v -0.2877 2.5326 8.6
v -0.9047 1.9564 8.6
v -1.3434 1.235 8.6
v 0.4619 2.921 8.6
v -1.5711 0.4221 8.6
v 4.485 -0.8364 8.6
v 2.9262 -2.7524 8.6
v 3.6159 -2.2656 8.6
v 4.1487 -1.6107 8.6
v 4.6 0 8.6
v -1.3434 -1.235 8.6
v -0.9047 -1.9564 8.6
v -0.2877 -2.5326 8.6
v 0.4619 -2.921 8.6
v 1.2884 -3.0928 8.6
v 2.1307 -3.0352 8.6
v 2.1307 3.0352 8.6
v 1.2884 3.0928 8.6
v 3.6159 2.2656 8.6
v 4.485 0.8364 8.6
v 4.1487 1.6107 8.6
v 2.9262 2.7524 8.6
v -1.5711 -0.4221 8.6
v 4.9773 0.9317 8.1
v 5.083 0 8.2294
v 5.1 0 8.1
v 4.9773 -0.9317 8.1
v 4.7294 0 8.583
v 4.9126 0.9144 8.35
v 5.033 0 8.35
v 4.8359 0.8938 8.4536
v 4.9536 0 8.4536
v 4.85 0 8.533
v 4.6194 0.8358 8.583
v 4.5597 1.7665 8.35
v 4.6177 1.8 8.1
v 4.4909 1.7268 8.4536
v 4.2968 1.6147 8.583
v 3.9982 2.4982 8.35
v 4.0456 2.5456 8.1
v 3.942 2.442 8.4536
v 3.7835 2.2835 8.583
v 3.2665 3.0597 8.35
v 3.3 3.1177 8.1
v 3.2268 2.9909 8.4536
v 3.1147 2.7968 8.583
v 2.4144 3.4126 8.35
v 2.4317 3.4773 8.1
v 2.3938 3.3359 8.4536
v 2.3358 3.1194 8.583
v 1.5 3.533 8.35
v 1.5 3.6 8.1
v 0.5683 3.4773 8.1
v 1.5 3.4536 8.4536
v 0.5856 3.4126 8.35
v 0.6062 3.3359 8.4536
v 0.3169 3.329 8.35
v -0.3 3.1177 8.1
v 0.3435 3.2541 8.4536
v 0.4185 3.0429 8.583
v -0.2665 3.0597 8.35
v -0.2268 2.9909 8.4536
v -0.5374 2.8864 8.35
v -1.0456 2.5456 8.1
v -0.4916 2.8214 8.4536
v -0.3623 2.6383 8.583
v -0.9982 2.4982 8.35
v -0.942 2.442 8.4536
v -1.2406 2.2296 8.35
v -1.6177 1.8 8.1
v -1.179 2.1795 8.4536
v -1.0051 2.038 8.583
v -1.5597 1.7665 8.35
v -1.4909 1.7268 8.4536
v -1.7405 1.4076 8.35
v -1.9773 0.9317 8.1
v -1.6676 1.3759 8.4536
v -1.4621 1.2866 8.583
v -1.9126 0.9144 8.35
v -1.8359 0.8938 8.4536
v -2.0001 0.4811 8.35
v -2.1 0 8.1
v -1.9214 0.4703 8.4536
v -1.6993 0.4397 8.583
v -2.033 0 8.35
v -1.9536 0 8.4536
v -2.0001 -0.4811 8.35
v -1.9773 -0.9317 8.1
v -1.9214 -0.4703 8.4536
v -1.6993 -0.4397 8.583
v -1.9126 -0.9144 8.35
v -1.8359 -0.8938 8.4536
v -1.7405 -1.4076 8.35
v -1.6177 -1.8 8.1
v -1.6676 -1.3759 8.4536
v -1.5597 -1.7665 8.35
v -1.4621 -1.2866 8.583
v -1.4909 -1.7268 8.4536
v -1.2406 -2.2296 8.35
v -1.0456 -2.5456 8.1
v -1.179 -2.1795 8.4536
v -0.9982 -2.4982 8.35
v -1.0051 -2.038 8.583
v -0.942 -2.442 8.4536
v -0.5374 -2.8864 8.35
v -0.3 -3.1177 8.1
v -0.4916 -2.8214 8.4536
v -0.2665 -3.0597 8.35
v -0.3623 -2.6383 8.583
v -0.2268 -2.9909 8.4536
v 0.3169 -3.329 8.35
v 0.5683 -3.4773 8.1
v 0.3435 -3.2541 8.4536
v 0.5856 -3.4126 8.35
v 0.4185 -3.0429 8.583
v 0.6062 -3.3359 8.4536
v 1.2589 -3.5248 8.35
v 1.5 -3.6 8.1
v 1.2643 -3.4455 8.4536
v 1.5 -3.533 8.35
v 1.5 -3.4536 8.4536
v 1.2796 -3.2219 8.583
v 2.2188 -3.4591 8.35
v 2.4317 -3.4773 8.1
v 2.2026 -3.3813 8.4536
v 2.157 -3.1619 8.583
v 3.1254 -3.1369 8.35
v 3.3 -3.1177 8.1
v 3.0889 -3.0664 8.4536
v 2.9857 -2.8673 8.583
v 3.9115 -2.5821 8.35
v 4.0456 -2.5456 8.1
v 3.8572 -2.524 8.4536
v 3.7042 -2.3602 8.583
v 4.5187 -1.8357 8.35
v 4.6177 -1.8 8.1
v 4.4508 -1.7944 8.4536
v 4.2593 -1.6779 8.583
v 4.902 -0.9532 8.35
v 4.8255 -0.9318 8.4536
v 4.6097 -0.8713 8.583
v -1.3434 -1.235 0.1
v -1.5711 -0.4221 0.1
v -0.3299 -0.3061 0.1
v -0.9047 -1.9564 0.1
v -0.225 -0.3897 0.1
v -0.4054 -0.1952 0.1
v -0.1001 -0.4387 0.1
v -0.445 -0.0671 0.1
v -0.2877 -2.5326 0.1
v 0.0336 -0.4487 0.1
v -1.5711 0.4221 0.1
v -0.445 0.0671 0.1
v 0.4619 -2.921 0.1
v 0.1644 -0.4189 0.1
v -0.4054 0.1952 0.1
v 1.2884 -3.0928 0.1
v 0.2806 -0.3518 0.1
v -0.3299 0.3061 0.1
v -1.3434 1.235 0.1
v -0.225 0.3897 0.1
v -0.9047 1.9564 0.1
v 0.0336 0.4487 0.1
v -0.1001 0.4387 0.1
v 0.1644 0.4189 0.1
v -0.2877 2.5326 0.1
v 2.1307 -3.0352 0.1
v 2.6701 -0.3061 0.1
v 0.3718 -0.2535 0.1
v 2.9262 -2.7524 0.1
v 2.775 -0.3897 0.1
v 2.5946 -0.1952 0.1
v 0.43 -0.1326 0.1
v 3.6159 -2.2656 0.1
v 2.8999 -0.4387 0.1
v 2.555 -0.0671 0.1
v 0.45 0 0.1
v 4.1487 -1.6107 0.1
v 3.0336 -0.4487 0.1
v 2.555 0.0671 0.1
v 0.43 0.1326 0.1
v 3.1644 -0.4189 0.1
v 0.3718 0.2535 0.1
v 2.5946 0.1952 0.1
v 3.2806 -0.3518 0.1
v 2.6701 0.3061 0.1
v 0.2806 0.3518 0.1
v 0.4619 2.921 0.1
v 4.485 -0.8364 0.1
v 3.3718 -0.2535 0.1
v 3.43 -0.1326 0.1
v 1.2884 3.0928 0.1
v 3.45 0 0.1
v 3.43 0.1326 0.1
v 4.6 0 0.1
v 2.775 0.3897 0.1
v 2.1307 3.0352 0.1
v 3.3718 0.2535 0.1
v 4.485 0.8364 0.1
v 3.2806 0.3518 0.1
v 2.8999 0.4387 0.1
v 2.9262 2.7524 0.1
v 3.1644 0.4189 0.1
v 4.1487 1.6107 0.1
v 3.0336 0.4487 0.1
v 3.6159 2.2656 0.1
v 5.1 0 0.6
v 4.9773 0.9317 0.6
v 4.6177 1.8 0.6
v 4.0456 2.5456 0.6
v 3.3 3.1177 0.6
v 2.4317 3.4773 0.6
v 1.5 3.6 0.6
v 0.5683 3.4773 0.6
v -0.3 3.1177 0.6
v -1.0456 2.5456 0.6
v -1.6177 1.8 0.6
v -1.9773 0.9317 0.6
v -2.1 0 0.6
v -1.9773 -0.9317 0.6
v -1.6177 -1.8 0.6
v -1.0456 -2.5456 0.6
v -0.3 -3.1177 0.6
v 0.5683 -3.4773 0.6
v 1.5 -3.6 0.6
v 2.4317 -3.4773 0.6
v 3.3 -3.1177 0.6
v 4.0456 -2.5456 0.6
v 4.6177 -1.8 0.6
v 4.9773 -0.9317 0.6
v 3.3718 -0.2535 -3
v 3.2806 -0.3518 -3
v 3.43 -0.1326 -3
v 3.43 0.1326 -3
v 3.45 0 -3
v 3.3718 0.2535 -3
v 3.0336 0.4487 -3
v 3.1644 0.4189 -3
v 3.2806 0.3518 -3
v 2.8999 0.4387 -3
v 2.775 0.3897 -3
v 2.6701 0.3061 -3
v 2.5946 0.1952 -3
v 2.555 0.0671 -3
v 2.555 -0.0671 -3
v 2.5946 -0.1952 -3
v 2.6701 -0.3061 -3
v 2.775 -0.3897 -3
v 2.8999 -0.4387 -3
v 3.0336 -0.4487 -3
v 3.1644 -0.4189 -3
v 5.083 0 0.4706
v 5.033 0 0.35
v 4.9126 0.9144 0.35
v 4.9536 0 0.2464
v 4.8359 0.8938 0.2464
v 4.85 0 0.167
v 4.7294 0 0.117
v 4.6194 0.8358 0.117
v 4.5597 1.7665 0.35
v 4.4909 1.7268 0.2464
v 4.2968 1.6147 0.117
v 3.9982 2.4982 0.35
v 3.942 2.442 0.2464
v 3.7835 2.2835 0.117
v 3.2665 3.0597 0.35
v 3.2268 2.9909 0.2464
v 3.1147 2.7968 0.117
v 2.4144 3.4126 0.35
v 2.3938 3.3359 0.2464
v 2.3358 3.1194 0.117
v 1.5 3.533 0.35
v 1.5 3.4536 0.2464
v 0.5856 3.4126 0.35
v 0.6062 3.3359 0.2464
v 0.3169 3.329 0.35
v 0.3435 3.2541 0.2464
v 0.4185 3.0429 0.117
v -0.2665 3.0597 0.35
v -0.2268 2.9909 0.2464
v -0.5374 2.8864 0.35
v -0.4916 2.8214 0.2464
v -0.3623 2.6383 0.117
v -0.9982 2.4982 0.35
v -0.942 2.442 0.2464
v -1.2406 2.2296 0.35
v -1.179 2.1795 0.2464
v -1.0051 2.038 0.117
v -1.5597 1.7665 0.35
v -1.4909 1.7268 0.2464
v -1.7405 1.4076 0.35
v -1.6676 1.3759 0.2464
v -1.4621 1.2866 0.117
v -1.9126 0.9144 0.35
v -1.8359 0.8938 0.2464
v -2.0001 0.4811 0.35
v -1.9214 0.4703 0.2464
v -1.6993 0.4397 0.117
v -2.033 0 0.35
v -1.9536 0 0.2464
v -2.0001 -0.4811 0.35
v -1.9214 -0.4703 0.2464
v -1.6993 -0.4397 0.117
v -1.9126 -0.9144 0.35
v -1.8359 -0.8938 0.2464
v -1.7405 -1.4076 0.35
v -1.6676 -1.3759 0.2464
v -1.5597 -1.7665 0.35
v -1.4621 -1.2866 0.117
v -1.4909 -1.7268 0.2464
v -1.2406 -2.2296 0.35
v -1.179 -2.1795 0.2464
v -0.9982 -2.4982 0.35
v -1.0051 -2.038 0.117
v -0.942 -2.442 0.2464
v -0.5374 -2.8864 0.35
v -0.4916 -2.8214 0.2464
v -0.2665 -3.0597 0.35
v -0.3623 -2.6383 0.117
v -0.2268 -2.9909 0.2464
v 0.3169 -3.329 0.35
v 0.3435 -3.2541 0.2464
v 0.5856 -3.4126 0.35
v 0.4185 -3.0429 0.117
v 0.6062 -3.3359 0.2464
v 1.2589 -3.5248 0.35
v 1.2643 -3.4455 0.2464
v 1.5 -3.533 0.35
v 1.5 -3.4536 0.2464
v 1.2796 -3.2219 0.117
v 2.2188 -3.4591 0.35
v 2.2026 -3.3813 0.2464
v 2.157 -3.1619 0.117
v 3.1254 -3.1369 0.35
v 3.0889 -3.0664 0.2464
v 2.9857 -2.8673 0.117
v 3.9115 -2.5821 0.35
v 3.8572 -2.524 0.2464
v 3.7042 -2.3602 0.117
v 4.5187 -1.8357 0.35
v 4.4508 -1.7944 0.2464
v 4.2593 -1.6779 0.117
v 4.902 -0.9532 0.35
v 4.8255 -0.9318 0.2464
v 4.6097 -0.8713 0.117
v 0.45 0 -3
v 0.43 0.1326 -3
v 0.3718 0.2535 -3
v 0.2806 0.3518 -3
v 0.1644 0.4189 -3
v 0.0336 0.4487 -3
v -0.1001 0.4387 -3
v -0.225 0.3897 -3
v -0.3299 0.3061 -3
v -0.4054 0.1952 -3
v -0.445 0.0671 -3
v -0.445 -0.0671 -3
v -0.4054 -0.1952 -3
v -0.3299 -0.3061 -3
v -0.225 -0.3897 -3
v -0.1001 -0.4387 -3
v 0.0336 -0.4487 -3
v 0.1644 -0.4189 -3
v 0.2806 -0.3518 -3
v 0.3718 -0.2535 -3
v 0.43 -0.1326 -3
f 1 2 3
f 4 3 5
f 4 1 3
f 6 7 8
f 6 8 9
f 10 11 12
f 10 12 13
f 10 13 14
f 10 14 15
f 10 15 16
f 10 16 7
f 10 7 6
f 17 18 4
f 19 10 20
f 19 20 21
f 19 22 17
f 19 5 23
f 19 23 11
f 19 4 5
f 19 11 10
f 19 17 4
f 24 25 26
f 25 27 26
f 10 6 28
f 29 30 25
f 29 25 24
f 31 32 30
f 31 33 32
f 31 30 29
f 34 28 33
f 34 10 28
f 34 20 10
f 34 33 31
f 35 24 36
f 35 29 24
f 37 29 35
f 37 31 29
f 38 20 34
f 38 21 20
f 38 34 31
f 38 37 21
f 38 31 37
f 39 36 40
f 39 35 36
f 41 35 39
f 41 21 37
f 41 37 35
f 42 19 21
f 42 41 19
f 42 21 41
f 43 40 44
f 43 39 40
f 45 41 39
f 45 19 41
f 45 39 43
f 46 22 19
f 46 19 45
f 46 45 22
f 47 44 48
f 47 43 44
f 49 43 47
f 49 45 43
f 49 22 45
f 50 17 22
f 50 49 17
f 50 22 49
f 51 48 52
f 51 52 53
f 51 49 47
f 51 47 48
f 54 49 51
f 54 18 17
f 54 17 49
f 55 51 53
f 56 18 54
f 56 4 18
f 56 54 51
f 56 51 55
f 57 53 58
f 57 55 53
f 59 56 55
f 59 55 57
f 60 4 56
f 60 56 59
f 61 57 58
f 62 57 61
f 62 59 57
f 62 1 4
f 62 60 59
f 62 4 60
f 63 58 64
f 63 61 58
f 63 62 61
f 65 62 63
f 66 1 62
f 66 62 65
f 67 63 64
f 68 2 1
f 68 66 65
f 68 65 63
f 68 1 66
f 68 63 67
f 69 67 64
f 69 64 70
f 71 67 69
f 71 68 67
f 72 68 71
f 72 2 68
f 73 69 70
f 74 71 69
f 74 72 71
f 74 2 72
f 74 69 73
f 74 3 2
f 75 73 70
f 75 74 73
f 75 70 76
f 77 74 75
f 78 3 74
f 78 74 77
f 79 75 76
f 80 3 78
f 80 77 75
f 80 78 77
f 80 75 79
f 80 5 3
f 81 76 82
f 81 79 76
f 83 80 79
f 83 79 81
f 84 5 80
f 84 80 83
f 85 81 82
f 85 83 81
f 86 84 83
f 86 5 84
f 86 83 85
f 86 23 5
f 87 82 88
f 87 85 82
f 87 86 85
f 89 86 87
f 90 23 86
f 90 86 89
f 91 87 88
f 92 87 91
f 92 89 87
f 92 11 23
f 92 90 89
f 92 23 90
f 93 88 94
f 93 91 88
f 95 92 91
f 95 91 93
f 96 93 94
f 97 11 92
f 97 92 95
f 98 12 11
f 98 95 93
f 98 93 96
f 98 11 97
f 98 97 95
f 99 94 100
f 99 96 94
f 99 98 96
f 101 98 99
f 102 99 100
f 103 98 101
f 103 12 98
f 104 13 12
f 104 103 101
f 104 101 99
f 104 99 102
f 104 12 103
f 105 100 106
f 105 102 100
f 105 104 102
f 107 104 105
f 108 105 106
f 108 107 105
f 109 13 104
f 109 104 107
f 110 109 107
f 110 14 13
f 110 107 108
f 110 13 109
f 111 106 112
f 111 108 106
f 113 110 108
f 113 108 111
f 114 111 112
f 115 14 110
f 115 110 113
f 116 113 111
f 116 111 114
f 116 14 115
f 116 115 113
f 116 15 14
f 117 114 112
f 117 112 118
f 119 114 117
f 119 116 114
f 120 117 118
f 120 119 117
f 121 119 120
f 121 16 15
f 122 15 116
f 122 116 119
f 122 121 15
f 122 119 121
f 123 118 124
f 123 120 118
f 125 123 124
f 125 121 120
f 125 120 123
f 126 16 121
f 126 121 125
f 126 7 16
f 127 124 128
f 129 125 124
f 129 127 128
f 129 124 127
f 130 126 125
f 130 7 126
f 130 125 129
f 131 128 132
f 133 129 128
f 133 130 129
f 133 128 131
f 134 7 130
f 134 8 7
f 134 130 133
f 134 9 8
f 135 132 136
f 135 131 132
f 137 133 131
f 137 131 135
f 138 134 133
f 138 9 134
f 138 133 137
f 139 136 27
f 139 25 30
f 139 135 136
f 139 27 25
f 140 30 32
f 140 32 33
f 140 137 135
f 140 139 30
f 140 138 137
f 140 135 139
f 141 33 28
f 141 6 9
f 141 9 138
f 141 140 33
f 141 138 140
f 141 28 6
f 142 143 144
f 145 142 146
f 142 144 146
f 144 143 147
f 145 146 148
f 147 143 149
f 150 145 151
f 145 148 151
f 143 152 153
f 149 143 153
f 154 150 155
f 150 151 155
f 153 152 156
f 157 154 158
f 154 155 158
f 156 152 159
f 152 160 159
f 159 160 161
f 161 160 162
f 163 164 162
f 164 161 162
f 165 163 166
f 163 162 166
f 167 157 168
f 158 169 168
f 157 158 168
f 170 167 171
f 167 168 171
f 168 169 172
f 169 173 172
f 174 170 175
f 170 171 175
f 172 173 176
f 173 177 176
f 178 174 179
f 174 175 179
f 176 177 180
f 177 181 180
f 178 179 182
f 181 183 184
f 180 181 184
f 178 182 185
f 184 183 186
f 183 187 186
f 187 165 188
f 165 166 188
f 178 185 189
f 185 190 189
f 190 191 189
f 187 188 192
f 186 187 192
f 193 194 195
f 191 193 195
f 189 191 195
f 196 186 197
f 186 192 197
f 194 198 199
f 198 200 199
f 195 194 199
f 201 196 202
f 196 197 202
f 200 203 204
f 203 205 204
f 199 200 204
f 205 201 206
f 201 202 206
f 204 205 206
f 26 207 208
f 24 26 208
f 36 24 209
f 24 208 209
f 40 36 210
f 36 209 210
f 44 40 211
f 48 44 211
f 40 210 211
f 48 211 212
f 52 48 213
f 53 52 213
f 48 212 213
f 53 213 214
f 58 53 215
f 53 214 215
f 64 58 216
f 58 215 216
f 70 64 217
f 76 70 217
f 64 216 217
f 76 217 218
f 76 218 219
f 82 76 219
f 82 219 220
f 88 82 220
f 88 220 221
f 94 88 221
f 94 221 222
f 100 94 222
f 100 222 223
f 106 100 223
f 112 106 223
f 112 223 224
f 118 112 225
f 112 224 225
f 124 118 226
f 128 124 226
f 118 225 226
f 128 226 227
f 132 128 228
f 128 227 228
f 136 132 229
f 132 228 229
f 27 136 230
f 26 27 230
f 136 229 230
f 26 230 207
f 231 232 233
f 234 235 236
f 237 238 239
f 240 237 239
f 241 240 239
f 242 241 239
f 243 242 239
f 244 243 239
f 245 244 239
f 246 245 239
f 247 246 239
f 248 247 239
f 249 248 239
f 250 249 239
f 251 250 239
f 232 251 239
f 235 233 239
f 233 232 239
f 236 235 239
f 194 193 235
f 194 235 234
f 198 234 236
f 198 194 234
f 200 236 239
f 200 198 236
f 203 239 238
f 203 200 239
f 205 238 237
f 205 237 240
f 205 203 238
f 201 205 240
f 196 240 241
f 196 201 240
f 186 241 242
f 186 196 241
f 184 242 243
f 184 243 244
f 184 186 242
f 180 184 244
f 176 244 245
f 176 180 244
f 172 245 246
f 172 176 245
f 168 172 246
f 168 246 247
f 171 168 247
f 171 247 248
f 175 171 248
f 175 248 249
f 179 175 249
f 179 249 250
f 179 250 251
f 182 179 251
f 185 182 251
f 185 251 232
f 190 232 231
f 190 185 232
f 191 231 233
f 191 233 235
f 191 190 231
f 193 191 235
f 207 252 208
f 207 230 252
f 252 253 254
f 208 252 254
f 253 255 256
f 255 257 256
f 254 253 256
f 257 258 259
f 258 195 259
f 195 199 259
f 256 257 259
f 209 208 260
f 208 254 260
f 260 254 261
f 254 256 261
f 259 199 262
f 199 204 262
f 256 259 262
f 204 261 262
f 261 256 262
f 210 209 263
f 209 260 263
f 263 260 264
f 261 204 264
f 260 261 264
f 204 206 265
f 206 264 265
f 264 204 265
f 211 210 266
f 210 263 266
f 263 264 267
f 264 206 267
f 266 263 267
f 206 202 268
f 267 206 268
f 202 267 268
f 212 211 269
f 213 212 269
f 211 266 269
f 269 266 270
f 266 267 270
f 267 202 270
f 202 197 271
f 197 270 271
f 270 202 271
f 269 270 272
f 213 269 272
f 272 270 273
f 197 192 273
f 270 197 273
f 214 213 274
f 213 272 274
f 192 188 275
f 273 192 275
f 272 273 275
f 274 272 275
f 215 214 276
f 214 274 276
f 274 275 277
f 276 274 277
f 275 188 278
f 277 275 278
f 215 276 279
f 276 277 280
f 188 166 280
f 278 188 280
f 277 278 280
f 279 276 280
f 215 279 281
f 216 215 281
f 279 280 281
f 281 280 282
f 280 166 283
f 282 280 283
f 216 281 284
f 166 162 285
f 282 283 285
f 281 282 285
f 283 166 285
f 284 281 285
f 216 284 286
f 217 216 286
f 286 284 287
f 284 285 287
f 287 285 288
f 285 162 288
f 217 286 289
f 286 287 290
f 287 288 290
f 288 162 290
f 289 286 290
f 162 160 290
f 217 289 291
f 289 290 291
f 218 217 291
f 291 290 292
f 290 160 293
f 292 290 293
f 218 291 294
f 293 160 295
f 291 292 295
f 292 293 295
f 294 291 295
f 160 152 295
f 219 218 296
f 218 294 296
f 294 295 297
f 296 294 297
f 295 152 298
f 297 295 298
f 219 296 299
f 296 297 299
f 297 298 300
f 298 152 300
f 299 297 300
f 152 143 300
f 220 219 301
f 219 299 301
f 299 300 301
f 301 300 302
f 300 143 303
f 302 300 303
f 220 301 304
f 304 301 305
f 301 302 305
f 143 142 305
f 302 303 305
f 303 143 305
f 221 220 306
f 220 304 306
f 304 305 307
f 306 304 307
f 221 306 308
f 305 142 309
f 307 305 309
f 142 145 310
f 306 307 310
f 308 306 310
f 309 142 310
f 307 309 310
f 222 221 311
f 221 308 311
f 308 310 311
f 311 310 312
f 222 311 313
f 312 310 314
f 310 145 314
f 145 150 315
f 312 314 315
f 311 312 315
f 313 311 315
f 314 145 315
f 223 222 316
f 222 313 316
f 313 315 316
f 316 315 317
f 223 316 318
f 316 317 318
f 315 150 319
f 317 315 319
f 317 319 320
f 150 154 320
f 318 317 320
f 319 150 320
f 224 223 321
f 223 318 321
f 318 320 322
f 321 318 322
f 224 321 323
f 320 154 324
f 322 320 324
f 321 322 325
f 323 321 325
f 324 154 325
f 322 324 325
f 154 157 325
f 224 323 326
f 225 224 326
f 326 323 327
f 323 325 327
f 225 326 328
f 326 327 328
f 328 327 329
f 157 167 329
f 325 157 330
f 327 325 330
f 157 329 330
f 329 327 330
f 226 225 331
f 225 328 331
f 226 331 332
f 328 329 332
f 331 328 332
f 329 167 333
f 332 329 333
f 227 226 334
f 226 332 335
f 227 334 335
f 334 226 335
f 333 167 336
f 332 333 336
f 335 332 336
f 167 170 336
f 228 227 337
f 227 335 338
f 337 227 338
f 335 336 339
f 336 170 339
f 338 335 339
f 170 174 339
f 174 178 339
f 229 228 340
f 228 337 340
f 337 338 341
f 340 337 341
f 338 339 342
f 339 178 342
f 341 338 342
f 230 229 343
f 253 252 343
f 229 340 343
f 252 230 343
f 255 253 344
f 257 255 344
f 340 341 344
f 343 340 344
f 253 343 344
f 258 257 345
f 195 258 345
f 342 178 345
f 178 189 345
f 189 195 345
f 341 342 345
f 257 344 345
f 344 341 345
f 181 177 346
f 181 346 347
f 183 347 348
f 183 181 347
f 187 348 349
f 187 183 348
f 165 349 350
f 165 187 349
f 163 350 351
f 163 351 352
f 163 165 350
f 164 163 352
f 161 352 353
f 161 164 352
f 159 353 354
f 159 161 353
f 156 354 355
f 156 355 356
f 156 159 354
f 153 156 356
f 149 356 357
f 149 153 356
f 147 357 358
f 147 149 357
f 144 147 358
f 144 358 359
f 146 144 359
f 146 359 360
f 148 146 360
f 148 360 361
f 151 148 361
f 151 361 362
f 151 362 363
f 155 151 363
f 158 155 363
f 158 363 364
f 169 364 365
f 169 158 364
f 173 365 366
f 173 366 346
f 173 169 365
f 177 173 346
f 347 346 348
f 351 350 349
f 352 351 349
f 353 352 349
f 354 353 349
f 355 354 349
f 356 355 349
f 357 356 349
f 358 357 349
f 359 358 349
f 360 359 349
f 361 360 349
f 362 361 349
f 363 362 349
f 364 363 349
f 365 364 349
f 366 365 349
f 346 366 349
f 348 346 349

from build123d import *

# Parameters (mm, degrees)
SKETCH_R          = 3.6
PAD_DEPTH         = 8.5
FILLET_R          = 0.5
SKETCH001_R       = 0.45
PAD001_DEPTH      = 4.25
PAD001_DEPTH_BACK = 3.5


with BuildPart() as fillet_body:
    # Sketch → Pad (new body)
    with BuildSketch(Plane.XY.offset(0.1)):
        with Locations((1.5, 0)):
            Circle(SKETCH_R)
    extrude(amount=PAD_DEPTH)

    # Fillet
    fillet_edges = [fillet_body.edges().sort_by_distance(p)[0] for p in [
        (-2.1, 0, 0.1),
        (-2.1, 0, 8.6),
    ]]
    fillet(fillet_edges, radius=FILLET_R)


with BuildPart() as pad001_mp_cp:
    # Sketch001 → Pad001 (new body, two sides)
    with BuildSketch(Plane.XY.offset(0.5)) as pad001_sk:
        Circle(SKETCH001_R)
        with Locations((3, 0)):
            Circle(SKETCH001_R)
    extrude(amount=PAD001_DEPTH)
    extrude(pad001_sk.sketch, amount=-PAD001_DEPTH_BACK)

    # Pad001_mp_cp: union Fillet body
    add(fillet_body.part)


solid = pad001_mp_cp.part
